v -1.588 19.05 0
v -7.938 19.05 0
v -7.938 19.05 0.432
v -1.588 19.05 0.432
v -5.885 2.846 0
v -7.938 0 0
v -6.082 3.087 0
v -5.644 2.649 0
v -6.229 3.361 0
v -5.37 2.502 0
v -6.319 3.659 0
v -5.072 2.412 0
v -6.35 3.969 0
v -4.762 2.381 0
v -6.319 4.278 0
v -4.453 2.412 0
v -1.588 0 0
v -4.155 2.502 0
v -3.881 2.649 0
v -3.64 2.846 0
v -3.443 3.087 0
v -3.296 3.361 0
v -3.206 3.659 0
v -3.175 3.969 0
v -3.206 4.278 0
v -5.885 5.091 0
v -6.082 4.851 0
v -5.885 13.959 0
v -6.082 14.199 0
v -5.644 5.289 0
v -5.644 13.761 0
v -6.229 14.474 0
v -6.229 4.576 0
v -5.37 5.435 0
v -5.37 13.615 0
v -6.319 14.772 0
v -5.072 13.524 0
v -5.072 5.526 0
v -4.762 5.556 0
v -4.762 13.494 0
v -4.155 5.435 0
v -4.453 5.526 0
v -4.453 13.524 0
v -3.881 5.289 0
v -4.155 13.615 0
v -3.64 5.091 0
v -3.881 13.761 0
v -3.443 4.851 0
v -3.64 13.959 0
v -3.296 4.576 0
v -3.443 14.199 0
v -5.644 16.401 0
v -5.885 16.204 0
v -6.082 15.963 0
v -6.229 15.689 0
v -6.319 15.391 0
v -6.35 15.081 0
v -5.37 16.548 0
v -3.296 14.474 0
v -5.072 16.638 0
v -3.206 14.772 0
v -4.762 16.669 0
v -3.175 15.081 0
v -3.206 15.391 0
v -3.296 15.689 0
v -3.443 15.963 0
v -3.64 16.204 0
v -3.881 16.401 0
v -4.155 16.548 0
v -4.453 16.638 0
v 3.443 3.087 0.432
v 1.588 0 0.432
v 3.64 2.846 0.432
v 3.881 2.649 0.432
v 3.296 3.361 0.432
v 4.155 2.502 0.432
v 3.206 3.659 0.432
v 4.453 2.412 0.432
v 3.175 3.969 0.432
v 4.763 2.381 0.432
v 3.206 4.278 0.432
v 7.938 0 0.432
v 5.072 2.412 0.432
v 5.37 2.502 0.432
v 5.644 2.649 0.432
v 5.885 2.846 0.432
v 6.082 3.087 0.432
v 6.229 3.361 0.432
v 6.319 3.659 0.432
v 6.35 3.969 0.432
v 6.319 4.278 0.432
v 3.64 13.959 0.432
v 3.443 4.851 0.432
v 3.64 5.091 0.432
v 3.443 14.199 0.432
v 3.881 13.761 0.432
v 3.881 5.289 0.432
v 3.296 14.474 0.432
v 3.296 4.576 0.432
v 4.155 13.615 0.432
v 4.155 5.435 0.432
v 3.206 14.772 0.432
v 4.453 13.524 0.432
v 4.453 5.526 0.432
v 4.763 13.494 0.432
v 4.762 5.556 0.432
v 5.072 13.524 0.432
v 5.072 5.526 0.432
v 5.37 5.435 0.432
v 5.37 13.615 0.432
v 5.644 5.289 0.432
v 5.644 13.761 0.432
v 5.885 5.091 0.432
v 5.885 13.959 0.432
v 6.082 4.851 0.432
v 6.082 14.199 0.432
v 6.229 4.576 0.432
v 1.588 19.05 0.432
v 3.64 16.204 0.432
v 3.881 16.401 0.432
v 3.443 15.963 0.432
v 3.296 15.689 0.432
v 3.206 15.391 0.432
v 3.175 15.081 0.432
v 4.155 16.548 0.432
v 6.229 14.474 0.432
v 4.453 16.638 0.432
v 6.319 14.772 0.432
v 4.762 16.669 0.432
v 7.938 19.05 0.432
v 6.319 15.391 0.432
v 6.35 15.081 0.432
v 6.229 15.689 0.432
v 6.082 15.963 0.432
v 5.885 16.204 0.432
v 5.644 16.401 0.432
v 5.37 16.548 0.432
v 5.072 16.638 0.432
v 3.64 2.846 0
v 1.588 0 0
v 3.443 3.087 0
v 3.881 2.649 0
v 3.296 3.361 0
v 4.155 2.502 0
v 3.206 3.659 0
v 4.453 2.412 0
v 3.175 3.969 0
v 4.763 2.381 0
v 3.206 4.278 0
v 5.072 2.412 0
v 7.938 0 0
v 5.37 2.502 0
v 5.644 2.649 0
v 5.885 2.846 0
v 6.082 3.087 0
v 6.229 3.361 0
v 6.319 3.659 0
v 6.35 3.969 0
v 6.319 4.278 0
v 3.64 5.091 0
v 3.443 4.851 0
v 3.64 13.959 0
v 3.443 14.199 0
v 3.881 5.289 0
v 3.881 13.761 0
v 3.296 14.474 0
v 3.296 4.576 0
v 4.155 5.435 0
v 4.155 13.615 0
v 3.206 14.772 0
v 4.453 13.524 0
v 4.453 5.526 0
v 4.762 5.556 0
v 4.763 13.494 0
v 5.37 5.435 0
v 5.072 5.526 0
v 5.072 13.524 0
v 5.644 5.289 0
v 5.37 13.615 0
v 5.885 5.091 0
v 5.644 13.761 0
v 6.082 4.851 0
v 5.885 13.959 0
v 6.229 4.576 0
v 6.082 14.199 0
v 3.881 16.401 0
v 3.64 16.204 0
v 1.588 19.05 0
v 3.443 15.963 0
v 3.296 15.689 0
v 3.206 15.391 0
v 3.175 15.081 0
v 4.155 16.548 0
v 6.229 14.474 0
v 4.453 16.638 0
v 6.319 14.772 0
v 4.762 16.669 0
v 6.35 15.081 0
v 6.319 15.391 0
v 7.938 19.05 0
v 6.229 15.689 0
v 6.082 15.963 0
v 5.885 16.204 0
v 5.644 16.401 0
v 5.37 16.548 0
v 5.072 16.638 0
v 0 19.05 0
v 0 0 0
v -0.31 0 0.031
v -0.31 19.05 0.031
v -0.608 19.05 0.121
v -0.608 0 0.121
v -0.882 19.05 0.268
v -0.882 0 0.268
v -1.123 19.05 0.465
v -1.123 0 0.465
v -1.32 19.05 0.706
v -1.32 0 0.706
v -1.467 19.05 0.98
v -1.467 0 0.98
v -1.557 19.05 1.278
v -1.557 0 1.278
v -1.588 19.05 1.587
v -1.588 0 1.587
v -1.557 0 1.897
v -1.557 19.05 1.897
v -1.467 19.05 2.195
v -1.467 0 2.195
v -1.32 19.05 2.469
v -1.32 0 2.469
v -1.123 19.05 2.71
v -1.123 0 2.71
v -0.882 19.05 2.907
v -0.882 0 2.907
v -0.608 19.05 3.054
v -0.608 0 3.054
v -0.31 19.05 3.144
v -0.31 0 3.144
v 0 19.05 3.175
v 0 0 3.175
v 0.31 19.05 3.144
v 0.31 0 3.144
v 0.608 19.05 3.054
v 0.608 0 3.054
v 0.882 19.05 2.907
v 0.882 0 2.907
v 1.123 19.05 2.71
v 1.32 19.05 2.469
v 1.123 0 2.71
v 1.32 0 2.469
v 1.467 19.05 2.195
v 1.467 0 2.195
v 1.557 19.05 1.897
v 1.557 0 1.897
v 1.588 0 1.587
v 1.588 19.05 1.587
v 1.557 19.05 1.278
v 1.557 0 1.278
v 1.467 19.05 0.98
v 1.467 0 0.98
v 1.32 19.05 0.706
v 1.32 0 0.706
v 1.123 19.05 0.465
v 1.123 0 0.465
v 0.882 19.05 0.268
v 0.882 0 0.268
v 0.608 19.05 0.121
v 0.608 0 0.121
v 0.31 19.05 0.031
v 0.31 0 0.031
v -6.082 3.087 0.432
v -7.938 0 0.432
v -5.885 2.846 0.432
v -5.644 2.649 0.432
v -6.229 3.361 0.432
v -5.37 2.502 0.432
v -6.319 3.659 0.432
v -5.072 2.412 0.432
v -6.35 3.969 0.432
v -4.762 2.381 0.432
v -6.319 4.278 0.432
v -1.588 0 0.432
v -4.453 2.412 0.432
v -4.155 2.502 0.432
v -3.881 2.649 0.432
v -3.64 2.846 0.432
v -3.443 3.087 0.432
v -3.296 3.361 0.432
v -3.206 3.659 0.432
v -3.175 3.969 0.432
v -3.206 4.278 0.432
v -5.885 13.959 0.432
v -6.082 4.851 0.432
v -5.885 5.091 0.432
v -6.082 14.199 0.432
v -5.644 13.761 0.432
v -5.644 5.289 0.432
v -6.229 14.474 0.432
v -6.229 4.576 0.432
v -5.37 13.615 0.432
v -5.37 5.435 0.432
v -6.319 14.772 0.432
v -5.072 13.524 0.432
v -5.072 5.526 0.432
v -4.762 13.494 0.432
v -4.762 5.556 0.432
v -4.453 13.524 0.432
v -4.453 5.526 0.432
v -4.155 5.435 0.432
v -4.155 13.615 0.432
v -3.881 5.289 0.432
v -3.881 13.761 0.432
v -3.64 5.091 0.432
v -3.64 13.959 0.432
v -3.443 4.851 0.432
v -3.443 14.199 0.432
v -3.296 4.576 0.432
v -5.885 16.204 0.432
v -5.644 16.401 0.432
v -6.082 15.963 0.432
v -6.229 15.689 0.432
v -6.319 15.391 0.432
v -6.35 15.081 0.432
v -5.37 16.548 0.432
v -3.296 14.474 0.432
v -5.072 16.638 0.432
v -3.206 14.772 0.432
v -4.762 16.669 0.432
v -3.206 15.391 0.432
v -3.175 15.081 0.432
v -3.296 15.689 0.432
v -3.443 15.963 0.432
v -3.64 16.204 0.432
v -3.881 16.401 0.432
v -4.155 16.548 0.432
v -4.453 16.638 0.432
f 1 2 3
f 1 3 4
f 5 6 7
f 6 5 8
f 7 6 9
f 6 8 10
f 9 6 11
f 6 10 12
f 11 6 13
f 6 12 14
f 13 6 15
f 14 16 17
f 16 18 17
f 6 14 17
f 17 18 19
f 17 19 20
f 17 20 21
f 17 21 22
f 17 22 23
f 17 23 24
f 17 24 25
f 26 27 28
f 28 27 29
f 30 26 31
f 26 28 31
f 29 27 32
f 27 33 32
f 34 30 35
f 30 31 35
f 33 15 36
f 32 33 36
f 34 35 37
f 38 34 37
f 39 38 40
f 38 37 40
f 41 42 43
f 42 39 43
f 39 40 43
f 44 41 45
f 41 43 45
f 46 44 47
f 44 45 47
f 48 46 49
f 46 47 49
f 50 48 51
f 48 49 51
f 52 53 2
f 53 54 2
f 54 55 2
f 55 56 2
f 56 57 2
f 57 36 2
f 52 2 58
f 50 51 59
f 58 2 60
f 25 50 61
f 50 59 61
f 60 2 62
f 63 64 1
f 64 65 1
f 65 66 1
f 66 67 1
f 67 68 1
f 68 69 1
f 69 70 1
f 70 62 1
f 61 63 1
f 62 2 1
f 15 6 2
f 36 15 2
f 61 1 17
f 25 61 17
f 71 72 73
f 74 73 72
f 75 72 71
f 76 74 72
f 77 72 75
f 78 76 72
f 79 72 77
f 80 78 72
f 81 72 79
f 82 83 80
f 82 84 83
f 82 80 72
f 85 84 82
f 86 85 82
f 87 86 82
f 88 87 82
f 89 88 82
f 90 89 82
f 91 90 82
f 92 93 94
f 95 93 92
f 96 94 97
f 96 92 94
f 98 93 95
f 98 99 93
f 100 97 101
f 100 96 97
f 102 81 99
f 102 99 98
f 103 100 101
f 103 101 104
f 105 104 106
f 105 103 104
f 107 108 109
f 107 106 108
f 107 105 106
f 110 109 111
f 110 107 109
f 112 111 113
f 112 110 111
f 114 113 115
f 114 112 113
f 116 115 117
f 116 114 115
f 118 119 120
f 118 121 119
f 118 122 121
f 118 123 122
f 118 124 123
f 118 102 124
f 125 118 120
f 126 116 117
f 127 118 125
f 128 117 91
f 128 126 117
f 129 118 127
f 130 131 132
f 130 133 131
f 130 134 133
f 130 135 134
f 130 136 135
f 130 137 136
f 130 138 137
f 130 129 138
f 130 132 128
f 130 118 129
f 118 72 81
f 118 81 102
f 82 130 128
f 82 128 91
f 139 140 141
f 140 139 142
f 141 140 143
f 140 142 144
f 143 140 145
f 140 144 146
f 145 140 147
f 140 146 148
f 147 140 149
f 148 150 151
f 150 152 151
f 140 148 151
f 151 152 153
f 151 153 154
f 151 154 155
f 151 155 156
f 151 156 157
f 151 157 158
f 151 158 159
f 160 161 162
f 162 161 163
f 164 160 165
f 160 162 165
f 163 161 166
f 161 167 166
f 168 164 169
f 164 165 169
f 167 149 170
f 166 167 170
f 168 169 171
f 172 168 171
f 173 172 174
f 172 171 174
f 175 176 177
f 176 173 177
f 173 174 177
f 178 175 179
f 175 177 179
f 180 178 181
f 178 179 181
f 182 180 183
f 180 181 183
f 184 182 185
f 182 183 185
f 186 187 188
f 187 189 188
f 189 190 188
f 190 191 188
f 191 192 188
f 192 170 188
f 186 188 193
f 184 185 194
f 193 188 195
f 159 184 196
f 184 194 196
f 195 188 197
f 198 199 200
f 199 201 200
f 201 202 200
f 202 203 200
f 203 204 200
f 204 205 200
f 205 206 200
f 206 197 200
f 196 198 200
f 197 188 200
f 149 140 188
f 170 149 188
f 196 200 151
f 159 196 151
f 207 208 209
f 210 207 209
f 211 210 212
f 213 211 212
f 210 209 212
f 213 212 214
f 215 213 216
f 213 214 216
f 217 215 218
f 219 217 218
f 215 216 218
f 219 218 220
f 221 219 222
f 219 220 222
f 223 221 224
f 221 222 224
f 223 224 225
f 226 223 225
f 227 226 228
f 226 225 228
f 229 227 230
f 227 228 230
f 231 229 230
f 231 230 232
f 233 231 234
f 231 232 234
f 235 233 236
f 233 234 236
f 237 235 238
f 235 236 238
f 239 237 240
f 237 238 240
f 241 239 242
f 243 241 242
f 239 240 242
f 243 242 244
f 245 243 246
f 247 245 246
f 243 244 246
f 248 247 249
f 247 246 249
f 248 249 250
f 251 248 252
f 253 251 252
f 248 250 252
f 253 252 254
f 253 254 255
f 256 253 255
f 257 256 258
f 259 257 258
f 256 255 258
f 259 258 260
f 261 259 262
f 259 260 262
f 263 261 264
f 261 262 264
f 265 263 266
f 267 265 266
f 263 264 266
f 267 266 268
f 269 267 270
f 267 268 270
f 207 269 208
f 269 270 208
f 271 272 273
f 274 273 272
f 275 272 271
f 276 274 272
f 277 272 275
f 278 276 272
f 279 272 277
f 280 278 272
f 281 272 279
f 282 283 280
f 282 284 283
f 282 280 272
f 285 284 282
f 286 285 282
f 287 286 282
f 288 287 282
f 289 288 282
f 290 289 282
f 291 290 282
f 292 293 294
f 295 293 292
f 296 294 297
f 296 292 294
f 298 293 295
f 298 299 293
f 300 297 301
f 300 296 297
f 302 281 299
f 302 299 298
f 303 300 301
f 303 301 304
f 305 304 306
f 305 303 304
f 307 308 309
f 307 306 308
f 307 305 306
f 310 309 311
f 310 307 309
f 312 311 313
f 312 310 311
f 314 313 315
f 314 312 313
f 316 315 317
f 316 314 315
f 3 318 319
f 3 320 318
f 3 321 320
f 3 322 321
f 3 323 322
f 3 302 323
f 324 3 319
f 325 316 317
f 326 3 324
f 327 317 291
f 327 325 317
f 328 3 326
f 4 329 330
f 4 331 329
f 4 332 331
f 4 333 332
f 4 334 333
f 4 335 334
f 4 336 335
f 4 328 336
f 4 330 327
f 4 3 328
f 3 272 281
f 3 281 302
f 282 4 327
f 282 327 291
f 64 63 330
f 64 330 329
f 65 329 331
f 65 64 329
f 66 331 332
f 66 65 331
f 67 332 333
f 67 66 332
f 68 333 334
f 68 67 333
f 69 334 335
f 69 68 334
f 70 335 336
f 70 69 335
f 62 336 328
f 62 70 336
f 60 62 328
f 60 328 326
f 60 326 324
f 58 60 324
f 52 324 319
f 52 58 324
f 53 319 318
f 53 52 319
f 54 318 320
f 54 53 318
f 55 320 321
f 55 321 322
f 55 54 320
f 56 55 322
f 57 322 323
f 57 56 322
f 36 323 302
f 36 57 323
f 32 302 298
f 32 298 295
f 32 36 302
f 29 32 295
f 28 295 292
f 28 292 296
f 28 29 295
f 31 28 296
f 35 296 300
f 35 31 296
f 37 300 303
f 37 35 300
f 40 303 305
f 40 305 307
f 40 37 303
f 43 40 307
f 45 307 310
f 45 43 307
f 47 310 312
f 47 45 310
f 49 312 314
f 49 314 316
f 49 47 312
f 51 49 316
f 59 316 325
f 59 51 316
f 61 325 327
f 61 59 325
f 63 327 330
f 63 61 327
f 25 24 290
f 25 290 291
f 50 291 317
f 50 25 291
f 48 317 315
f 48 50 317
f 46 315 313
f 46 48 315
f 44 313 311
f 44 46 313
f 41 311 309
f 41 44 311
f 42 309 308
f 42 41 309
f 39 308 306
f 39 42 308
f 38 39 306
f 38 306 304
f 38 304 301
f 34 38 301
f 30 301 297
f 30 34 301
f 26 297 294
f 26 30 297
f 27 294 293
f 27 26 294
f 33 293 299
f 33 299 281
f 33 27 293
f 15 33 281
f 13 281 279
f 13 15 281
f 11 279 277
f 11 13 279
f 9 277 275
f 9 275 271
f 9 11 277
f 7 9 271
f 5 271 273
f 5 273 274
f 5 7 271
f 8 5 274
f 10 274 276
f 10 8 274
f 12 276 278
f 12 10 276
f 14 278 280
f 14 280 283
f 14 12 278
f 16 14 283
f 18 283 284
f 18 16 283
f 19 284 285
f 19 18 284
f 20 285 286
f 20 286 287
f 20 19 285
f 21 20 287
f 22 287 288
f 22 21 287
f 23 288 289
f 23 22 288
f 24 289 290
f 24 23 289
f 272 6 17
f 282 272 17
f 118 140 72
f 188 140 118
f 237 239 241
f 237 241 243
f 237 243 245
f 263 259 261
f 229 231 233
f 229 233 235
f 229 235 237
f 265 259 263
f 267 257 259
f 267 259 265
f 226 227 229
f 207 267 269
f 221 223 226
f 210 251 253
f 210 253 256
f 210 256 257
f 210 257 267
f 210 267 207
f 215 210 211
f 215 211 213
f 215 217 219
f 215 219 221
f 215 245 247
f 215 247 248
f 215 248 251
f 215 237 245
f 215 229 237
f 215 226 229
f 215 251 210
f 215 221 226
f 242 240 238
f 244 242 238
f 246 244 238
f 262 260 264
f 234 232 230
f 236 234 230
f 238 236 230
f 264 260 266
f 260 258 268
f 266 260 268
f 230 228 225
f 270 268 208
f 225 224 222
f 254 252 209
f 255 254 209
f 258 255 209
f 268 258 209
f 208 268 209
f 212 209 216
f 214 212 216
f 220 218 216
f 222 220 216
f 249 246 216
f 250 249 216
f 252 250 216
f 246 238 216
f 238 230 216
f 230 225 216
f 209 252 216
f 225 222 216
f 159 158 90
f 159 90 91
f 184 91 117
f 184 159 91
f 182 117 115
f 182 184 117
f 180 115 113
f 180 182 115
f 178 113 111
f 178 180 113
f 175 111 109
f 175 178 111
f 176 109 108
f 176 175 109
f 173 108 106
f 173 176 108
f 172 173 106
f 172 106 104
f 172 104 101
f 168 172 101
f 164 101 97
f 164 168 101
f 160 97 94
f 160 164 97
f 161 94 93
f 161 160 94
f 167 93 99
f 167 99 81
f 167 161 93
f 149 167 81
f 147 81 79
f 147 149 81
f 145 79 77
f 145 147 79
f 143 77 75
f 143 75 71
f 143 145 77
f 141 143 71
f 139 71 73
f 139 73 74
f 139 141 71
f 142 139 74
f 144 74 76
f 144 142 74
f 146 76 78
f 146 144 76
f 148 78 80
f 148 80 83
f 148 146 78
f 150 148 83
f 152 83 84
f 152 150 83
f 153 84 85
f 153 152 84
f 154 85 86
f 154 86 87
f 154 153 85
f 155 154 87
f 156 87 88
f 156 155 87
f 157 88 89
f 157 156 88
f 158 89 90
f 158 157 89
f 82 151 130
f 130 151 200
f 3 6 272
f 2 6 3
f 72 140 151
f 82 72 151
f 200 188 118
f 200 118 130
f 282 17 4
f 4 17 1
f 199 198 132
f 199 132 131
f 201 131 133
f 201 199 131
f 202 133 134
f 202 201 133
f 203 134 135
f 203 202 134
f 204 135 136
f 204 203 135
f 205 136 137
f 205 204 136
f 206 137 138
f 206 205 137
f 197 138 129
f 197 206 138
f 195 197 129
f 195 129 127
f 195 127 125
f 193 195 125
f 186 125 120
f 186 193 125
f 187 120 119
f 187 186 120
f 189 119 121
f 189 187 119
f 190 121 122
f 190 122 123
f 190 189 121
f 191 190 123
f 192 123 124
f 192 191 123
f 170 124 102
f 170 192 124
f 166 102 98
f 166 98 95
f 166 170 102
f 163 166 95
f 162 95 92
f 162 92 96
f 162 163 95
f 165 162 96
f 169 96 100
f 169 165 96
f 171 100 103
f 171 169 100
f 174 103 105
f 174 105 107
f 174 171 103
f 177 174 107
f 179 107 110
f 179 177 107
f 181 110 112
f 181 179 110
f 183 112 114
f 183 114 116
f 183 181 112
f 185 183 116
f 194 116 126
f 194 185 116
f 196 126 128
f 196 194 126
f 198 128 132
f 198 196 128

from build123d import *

# Parameters (mm, degrees)
SKETCH1_W             = 6.35
SKETCH1_H             = 19.05
SKETCH1_R             = 1.5875
BOSS_EXTRUDE1_DEPTH   = 0.4318
BOSS_EXTRUDE1_2_DEPTH = 0.4318
SKETCH2_R             = 1.5875
BOSS_EXTRUDE2_DEPTH   = 19.05


with BuildPart() as part:
    # Sketch1 → Boss-Extrude1 (new body)
    with BuildSketch(Plane.XY):
        with Locations((-4.7625, 9.525)):
            Rectangle(SKETCH1_W, SKETCH1_H)
        with Locations((-4.7625, 15.08125)):
            Circle(SKETCH1_R, mode=Mode.SUBTRACT)
        with Locations((-4.7625, 3.96875)):
            Circle(SKETCH1_R, mode=Mode.SUBTRACT)
    extrude(amount=BOSS_EXTRUDE1_DEPTH)


with BuildPart() as body_2:
    # Sketch1 → Boss-Extrude1 2 (new body)
    with BuildSketch(Plane.XY):
        with Locations((4.7625, 9.525)):
            Rectangle(SKETCH1_W, SKETCH1_H)
        with Locations((4.7625, 3.96875)):
            Circle(SKETCH1_R, mode=Mode.SUBTRACT)
        with Locations((4.7625, 15.08125)):
            Circle(SKETCH1_R, mode=Mode.SUBTRACT)
    extrude(amount=BOSS_EXTRUDE1_2_DEPTH)


with BuildPart() as body_3:
    # Sketch2 → Boss-Extrude2 (new body)
    with BuildSketch(Plane(origin=(0, 0, 0), x_dir=(1, 0, 0), z_dir=(0, 1, 0))):
        with Locations(Location((0, -1.5875, 0), (0, 0, 90))):
            Circle(SKETCH2_R)
    extrude(amount=BOSS_EXTRUDE2_DEPTH)


solid = Compound([part.part, body_2.part, body_3.part])
